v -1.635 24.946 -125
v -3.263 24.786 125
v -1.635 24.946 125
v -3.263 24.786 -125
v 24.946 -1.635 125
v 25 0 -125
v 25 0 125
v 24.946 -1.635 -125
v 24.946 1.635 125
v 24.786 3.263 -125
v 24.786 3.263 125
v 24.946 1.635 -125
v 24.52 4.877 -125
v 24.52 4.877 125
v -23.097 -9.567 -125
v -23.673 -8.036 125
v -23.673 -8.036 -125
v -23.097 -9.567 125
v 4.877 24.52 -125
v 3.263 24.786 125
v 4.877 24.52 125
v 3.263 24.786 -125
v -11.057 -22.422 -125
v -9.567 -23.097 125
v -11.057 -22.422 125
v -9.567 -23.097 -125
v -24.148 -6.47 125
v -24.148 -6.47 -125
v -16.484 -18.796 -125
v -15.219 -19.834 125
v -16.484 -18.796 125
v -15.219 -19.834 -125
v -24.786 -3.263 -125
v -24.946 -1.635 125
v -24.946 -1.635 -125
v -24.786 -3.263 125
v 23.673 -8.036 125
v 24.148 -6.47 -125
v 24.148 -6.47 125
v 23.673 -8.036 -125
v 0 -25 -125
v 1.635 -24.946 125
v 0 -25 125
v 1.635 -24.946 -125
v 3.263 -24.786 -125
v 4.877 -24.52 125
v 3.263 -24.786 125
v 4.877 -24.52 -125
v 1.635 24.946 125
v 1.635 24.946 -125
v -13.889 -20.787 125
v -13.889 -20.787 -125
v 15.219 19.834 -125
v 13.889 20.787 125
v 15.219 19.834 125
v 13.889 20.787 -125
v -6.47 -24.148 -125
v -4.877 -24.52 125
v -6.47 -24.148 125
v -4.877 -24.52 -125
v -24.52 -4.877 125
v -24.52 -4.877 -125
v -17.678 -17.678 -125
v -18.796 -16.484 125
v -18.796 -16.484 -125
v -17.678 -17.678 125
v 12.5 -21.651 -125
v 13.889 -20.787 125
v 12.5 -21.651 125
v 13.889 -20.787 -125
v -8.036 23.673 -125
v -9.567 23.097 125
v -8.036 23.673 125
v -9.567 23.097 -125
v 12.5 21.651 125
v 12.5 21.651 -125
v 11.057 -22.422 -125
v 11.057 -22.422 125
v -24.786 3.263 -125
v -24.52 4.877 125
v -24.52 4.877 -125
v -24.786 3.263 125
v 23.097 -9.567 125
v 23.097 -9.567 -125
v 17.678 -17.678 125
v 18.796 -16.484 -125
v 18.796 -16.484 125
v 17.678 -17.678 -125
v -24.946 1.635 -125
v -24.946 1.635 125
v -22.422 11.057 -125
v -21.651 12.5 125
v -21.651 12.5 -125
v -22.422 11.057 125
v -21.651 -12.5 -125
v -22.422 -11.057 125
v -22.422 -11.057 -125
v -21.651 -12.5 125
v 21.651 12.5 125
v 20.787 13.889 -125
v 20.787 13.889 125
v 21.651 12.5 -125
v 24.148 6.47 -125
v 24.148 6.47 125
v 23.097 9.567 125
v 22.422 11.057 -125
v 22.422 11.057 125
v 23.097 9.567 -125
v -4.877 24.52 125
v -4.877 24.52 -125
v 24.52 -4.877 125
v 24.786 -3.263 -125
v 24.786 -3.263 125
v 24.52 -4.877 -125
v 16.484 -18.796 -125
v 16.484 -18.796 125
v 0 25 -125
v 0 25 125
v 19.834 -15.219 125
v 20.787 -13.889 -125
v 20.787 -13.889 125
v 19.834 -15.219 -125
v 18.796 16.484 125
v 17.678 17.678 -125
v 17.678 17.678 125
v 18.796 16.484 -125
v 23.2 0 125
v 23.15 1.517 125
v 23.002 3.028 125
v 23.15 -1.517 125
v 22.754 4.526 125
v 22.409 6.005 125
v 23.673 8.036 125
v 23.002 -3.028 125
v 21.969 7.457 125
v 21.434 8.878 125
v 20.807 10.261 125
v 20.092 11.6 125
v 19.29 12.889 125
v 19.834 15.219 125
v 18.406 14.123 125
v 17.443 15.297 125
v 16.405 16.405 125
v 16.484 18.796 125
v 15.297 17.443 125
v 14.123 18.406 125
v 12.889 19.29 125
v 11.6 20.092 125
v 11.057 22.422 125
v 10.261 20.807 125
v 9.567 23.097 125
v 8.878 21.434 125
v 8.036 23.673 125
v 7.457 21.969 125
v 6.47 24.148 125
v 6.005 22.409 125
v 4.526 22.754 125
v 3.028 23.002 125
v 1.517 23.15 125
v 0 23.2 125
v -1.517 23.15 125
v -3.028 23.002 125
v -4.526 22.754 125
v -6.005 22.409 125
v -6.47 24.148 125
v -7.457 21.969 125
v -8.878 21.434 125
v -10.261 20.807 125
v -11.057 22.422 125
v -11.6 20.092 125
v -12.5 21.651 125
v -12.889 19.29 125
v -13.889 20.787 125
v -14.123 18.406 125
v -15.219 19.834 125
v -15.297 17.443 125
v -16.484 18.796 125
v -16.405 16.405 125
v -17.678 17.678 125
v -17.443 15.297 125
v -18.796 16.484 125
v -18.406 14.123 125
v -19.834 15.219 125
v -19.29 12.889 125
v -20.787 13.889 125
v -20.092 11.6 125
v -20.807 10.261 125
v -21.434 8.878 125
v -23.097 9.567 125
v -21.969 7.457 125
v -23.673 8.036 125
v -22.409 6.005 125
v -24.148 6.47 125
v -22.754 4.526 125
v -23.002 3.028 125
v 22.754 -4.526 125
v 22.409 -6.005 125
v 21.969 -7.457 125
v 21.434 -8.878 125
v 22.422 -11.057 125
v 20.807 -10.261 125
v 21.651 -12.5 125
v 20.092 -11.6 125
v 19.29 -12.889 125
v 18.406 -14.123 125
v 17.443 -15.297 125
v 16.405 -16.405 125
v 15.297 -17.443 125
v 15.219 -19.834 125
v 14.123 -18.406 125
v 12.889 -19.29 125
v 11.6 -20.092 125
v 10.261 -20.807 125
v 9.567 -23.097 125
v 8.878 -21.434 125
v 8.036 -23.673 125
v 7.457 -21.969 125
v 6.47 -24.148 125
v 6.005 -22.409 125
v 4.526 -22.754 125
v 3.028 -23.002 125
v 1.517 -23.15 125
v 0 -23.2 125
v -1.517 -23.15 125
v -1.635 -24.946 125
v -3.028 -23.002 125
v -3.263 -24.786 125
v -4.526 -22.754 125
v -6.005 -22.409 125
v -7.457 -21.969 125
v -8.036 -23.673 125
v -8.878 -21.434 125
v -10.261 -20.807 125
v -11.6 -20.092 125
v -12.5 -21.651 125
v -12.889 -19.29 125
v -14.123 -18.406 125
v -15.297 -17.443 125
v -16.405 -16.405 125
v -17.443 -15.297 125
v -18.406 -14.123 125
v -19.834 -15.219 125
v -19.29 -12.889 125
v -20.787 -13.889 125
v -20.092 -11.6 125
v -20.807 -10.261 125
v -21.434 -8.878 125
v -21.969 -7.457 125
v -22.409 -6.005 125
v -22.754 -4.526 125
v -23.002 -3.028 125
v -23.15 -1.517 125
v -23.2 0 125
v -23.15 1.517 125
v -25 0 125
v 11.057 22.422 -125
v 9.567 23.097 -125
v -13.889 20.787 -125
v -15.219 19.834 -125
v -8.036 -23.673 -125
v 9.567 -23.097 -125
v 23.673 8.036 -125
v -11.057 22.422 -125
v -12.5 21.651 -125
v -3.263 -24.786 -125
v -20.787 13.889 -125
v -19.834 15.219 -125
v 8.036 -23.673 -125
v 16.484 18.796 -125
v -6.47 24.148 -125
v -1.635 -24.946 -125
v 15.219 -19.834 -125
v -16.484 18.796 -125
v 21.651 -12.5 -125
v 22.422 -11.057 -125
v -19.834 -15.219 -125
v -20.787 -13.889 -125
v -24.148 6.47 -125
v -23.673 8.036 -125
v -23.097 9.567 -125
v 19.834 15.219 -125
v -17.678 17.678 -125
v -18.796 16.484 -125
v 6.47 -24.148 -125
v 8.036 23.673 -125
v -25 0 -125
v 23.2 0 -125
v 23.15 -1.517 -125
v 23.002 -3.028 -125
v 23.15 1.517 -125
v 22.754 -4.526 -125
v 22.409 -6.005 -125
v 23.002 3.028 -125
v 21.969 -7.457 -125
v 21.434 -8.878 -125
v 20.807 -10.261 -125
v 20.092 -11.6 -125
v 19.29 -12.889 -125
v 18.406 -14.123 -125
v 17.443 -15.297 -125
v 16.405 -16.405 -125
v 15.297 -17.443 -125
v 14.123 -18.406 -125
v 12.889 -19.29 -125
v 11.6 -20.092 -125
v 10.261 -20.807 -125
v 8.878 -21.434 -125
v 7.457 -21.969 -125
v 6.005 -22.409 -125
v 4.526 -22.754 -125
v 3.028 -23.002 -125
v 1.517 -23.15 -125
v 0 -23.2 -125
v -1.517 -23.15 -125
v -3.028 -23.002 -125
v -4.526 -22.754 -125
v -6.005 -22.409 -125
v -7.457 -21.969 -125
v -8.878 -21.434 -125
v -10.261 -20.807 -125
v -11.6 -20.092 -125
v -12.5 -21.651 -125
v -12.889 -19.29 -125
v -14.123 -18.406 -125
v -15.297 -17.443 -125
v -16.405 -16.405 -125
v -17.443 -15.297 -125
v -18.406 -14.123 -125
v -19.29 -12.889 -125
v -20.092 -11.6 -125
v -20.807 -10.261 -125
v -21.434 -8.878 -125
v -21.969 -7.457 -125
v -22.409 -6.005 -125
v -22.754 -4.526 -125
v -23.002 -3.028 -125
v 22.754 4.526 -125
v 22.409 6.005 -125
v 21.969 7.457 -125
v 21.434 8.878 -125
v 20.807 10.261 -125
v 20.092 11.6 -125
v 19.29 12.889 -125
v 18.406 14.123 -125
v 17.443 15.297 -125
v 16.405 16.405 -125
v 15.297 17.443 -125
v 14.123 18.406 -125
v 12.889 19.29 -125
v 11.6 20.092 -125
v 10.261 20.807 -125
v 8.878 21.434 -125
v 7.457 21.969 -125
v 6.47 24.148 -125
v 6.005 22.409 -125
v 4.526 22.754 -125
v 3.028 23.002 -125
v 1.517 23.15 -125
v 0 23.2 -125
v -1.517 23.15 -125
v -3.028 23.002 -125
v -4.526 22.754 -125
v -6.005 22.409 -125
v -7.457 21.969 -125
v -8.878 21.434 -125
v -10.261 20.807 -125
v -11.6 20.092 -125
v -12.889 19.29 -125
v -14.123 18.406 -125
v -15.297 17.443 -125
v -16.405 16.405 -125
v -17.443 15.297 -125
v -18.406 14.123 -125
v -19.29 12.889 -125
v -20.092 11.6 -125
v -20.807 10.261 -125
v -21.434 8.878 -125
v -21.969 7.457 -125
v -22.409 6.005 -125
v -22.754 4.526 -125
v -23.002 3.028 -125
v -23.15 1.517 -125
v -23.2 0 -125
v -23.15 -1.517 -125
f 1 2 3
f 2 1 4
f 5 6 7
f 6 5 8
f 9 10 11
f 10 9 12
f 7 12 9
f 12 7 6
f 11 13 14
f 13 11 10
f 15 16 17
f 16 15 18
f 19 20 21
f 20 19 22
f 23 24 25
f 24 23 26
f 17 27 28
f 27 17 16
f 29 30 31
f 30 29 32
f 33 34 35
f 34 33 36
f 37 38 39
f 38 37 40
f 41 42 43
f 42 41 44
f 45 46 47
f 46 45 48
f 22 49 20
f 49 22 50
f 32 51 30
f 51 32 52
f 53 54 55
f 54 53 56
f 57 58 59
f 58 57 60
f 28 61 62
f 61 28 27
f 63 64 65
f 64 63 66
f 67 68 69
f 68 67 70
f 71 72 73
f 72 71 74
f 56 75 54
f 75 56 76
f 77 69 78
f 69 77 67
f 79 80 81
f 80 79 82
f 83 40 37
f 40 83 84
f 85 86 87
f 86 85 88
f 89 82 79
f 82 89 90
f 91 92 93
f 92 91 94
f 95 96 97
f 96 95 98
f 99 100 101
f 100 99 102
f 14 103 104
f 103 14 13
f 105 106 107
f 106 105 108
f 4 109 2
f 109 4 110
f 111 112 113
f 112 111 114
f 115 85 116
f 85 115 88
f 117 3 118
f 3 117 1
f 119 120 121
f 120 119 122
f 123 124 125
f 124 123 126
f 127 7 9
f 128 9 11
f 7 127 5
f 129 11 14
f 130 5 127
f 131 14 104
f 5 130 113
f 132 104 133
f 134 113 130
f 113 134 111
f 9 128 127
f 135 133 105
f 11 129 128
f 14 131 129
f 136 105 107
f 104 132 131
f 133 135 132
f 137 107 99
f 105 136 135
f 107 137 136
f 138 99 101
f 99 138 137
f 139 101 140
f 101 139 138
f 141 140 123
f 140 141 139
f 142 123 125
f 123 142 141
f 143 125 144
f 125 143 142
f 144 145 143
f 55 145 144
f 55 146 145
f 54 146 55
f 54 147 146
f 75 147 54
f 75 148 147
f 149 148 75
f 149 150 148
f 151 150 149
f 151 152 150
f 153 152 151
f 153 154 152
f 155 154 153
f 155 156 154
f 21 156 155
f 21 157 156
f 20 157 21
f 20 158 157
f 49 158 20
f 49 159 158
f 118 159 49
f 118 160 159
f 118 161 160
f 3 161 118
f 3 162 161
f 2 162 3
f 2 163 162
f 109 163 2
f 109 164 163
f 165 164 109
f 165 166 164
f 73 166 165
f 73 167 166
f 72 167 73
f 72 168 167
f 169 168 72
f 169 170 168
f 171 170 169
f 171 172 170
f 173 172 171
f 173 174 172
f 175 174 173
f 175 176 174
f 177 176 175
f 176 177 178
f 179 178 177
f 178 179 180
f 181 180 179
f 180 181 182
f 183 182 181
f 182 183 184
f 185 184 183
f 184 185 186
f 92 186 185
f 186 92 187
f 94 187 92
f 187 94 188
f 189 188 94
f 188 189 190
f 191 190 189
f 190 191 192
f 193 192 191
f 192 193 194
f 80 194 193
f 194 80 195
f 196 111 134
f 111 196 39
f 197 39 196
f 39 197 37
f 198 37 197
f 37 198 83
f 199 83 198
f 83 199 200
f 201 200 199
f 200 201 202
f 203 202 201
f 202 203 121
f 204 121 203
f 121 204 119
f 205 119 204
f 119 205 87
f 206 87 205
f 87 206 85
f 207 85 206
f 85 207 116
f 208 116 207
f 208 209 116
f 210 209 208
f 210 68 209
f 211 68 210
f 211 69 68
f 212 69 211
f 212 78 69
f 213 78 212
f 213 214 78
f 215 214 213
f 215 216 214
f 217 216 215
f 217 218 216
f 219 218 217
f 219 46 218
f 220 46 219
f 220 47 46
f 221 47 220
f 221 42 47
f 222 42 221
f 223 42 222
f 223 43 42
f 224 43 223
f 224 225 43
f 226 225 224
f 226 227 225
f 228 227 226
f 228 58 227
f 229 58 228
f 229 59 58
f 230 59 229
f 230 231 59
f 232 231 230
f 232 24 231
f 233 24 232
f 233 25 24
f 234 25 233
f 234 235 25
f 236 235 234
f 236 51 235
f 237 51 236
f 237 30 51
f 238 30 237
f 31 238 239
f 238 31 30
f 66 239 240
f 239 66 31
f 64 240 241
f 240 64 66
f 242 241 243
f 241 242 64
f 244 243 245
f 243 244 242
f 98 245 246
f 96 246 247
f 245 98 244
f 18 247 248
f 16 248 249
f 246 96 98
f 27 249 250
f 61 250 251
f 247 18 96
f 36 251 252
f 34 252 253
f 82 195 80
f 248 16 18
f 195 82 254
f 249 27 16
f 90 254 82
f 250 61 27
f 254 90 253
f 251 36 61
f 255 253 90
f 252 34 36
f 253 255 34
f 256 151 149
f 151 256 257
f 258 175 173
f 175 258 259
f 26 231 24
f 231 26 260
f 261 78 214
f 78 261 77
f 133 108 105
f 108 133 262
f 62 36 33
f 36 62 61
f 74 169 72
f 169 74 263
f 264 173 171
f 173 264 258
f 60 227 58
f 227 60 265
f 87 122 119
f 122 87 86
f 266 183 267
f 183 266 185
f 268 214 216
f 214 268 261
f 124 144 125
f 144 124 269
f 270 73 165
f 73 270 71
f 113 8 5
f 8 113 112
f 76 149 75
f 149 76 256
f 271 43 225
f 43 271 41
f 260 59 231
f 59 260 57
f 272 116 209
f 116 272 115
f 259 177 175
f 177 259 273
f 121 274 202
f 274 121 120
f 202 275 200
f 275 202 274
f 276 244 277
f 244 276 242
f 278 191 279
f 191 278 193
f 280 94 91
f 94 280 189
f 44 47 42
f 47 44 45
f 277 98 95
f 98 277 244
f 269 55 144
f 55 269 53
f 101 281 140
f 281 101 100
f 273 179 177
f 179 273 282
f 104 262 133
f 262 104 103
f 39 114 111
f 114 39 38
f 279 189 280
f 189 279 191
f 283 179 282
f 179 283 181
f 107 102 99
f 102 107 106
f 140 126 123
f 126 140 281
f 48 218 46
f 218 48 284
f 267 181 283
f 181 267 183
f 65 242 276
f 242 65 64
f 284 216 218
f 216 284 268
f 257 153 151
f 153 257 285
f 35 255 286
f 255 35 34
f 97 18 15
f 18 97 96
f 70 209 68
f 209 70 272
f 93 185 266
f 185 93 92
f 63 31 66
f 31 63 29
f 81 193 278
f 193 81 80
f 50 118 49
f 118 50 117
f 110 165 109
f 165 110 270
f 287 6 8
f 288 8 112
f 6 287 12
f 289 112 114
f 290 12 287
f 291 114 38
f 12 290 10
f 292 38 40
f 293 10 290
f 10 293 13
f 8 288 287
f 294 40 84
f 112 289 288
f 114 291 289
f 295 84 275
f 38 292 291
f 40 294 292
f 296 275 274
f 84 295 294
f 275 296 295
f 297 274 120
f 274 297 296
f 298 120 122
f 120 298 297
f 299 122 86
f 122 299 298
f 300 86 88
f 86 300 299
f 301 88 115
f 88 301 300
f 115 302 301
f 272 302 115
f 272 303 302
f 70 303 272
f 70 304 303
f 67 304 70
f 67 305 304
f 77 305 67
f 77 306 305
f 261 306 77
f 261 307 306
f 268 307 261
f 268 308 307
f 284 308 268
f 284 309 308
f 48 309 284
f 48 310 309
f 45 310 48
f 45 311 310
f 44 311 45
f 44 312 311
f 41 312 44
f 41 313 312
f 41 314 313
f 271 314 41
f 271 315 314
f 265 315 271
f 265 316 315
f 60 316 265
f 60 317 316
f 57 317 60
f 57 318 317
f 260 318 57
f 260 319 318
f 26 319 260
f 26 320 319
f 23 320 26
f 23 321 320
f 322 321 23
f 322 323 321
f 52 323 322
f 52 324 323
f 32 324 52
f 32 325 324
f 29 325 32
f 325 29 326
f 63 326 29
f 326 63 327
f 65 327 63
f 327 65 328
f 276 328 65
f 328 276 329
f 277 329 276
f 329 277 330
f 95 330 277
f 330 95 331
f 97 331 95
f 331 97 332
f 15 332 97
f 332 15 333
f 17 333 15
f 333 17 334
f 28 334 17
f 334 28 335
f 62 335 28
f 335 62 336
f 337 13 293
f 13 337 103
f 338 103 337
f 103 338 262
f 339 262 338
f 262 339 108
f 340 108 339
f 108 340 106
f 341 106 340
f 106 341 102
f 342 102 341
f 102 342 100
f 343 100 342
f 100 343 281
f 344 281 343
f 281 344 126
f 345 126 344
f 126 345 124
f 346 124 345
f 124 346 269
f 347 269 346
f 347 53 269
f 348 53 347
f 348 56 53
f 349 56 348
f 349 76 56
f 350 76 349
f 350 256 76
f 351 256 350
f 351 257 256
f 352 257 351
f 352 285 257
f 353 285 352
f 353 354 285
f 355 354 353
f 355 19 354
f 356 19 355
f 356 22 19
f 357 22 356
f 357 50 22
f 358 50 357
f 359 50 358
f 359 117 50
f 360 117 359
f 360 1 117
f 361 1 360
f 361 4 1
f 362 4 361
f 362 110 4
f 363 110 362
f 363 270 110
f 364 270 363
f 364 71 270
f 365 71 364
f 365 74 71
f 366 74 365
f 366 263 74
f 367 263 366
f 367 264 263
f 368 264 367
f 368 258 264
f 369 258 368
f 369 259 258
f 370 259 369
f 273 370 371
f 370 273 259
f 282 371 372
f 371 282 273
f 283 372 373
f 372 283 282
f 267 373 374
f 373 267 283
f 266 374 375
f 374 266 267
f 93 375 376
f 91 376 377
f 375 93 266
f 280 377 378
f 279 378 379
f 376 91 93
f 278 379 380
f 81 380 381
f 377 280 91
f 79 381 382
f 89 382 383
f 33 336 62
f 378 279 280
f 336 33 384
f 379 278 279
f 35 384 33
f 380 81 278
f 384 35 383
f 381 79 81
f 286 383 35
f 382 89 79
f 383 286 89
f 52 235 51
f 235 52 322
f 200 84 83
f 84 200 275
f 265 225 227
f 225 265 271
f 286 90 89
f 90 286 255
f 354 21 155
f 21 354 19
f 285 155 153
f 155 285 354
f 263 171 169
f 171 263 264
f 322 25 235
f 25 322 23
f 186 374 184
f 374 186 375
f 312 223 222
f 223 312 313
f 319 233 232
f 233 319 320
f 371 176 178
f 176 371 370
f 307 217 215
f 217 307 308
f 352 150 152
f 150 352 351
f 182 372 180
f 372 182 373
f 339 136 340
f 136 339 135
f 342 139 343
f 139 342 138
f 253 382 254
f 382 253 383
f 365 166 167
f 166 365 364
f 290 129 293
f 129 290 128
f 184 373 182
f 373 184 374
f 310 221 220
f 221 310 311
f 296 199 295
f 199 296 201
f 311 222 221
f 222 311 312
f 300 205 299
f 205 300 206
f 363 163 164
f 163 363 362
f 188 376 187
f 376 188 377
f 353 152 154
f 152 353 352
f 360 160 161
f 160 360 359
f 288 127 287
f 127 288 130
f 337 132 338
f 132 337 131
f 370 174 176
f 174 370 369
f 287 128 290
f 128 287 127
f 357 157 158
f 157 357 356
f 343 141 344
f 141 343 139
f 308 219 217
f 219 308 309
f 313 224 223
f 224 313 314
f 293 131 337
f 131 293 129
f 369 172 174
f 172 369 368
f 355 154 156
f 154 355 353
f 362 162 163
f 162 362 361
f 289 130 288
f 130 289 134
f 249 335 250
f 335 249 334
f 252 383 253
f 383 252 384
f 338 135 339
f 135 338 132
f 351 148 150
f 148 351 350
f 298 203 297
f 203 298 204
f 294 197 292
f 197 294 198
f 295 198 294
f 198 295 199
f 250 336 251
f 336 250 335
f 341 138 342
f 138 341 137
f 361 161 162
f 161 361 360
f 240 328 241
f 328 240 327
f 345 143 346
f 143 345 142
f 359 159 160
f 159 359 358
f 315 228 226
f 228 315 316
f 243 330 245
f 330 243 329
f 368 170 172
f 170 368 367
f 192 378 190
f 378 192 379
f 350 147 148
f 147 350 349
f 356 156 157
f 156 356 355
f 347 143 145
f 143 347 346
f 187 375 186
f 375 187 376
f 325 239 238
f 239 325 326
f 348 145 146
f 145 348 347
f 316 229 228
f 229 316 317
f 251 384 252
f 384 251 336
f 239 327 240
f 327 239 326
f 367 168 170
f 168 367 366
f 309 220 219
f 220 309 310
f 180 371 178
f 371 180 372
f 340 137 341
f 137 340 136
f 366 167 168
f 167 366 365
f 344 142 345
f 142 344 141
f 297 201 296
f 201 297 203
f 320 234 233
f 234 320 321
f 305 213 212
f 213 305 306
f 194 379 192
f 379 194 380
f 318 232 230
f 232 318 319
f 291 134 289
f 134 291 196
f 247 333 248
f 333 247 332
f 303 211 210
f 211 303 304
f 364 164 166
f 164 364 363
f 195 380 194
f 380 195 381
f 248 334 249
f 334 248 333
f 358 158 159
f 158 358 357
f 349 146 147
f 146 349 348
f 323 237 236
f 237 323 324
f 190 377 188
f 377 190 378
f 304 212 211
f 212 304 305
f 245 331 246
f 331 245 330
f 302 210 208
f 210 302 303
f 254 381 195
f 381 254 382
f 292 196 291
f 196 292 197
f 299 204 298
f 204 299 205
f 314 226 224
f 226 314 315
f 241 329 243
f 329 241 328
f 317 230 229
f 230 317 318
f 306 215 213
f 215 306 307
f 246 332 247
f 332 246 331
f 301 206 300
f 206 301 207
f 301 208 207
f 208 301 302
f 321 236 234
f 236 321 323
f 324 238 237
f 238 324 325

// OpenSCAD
$fn=96;

module ht_pipe(od=50, wall=1.8, length=250) {
    difference() {
        cylinder(h=length, d=od, center=true);
        cylinder(h=length+2, d=od-2*wall, center=true);
    }
}

ht_pipe(od=50, wall=1.8, length=250);
